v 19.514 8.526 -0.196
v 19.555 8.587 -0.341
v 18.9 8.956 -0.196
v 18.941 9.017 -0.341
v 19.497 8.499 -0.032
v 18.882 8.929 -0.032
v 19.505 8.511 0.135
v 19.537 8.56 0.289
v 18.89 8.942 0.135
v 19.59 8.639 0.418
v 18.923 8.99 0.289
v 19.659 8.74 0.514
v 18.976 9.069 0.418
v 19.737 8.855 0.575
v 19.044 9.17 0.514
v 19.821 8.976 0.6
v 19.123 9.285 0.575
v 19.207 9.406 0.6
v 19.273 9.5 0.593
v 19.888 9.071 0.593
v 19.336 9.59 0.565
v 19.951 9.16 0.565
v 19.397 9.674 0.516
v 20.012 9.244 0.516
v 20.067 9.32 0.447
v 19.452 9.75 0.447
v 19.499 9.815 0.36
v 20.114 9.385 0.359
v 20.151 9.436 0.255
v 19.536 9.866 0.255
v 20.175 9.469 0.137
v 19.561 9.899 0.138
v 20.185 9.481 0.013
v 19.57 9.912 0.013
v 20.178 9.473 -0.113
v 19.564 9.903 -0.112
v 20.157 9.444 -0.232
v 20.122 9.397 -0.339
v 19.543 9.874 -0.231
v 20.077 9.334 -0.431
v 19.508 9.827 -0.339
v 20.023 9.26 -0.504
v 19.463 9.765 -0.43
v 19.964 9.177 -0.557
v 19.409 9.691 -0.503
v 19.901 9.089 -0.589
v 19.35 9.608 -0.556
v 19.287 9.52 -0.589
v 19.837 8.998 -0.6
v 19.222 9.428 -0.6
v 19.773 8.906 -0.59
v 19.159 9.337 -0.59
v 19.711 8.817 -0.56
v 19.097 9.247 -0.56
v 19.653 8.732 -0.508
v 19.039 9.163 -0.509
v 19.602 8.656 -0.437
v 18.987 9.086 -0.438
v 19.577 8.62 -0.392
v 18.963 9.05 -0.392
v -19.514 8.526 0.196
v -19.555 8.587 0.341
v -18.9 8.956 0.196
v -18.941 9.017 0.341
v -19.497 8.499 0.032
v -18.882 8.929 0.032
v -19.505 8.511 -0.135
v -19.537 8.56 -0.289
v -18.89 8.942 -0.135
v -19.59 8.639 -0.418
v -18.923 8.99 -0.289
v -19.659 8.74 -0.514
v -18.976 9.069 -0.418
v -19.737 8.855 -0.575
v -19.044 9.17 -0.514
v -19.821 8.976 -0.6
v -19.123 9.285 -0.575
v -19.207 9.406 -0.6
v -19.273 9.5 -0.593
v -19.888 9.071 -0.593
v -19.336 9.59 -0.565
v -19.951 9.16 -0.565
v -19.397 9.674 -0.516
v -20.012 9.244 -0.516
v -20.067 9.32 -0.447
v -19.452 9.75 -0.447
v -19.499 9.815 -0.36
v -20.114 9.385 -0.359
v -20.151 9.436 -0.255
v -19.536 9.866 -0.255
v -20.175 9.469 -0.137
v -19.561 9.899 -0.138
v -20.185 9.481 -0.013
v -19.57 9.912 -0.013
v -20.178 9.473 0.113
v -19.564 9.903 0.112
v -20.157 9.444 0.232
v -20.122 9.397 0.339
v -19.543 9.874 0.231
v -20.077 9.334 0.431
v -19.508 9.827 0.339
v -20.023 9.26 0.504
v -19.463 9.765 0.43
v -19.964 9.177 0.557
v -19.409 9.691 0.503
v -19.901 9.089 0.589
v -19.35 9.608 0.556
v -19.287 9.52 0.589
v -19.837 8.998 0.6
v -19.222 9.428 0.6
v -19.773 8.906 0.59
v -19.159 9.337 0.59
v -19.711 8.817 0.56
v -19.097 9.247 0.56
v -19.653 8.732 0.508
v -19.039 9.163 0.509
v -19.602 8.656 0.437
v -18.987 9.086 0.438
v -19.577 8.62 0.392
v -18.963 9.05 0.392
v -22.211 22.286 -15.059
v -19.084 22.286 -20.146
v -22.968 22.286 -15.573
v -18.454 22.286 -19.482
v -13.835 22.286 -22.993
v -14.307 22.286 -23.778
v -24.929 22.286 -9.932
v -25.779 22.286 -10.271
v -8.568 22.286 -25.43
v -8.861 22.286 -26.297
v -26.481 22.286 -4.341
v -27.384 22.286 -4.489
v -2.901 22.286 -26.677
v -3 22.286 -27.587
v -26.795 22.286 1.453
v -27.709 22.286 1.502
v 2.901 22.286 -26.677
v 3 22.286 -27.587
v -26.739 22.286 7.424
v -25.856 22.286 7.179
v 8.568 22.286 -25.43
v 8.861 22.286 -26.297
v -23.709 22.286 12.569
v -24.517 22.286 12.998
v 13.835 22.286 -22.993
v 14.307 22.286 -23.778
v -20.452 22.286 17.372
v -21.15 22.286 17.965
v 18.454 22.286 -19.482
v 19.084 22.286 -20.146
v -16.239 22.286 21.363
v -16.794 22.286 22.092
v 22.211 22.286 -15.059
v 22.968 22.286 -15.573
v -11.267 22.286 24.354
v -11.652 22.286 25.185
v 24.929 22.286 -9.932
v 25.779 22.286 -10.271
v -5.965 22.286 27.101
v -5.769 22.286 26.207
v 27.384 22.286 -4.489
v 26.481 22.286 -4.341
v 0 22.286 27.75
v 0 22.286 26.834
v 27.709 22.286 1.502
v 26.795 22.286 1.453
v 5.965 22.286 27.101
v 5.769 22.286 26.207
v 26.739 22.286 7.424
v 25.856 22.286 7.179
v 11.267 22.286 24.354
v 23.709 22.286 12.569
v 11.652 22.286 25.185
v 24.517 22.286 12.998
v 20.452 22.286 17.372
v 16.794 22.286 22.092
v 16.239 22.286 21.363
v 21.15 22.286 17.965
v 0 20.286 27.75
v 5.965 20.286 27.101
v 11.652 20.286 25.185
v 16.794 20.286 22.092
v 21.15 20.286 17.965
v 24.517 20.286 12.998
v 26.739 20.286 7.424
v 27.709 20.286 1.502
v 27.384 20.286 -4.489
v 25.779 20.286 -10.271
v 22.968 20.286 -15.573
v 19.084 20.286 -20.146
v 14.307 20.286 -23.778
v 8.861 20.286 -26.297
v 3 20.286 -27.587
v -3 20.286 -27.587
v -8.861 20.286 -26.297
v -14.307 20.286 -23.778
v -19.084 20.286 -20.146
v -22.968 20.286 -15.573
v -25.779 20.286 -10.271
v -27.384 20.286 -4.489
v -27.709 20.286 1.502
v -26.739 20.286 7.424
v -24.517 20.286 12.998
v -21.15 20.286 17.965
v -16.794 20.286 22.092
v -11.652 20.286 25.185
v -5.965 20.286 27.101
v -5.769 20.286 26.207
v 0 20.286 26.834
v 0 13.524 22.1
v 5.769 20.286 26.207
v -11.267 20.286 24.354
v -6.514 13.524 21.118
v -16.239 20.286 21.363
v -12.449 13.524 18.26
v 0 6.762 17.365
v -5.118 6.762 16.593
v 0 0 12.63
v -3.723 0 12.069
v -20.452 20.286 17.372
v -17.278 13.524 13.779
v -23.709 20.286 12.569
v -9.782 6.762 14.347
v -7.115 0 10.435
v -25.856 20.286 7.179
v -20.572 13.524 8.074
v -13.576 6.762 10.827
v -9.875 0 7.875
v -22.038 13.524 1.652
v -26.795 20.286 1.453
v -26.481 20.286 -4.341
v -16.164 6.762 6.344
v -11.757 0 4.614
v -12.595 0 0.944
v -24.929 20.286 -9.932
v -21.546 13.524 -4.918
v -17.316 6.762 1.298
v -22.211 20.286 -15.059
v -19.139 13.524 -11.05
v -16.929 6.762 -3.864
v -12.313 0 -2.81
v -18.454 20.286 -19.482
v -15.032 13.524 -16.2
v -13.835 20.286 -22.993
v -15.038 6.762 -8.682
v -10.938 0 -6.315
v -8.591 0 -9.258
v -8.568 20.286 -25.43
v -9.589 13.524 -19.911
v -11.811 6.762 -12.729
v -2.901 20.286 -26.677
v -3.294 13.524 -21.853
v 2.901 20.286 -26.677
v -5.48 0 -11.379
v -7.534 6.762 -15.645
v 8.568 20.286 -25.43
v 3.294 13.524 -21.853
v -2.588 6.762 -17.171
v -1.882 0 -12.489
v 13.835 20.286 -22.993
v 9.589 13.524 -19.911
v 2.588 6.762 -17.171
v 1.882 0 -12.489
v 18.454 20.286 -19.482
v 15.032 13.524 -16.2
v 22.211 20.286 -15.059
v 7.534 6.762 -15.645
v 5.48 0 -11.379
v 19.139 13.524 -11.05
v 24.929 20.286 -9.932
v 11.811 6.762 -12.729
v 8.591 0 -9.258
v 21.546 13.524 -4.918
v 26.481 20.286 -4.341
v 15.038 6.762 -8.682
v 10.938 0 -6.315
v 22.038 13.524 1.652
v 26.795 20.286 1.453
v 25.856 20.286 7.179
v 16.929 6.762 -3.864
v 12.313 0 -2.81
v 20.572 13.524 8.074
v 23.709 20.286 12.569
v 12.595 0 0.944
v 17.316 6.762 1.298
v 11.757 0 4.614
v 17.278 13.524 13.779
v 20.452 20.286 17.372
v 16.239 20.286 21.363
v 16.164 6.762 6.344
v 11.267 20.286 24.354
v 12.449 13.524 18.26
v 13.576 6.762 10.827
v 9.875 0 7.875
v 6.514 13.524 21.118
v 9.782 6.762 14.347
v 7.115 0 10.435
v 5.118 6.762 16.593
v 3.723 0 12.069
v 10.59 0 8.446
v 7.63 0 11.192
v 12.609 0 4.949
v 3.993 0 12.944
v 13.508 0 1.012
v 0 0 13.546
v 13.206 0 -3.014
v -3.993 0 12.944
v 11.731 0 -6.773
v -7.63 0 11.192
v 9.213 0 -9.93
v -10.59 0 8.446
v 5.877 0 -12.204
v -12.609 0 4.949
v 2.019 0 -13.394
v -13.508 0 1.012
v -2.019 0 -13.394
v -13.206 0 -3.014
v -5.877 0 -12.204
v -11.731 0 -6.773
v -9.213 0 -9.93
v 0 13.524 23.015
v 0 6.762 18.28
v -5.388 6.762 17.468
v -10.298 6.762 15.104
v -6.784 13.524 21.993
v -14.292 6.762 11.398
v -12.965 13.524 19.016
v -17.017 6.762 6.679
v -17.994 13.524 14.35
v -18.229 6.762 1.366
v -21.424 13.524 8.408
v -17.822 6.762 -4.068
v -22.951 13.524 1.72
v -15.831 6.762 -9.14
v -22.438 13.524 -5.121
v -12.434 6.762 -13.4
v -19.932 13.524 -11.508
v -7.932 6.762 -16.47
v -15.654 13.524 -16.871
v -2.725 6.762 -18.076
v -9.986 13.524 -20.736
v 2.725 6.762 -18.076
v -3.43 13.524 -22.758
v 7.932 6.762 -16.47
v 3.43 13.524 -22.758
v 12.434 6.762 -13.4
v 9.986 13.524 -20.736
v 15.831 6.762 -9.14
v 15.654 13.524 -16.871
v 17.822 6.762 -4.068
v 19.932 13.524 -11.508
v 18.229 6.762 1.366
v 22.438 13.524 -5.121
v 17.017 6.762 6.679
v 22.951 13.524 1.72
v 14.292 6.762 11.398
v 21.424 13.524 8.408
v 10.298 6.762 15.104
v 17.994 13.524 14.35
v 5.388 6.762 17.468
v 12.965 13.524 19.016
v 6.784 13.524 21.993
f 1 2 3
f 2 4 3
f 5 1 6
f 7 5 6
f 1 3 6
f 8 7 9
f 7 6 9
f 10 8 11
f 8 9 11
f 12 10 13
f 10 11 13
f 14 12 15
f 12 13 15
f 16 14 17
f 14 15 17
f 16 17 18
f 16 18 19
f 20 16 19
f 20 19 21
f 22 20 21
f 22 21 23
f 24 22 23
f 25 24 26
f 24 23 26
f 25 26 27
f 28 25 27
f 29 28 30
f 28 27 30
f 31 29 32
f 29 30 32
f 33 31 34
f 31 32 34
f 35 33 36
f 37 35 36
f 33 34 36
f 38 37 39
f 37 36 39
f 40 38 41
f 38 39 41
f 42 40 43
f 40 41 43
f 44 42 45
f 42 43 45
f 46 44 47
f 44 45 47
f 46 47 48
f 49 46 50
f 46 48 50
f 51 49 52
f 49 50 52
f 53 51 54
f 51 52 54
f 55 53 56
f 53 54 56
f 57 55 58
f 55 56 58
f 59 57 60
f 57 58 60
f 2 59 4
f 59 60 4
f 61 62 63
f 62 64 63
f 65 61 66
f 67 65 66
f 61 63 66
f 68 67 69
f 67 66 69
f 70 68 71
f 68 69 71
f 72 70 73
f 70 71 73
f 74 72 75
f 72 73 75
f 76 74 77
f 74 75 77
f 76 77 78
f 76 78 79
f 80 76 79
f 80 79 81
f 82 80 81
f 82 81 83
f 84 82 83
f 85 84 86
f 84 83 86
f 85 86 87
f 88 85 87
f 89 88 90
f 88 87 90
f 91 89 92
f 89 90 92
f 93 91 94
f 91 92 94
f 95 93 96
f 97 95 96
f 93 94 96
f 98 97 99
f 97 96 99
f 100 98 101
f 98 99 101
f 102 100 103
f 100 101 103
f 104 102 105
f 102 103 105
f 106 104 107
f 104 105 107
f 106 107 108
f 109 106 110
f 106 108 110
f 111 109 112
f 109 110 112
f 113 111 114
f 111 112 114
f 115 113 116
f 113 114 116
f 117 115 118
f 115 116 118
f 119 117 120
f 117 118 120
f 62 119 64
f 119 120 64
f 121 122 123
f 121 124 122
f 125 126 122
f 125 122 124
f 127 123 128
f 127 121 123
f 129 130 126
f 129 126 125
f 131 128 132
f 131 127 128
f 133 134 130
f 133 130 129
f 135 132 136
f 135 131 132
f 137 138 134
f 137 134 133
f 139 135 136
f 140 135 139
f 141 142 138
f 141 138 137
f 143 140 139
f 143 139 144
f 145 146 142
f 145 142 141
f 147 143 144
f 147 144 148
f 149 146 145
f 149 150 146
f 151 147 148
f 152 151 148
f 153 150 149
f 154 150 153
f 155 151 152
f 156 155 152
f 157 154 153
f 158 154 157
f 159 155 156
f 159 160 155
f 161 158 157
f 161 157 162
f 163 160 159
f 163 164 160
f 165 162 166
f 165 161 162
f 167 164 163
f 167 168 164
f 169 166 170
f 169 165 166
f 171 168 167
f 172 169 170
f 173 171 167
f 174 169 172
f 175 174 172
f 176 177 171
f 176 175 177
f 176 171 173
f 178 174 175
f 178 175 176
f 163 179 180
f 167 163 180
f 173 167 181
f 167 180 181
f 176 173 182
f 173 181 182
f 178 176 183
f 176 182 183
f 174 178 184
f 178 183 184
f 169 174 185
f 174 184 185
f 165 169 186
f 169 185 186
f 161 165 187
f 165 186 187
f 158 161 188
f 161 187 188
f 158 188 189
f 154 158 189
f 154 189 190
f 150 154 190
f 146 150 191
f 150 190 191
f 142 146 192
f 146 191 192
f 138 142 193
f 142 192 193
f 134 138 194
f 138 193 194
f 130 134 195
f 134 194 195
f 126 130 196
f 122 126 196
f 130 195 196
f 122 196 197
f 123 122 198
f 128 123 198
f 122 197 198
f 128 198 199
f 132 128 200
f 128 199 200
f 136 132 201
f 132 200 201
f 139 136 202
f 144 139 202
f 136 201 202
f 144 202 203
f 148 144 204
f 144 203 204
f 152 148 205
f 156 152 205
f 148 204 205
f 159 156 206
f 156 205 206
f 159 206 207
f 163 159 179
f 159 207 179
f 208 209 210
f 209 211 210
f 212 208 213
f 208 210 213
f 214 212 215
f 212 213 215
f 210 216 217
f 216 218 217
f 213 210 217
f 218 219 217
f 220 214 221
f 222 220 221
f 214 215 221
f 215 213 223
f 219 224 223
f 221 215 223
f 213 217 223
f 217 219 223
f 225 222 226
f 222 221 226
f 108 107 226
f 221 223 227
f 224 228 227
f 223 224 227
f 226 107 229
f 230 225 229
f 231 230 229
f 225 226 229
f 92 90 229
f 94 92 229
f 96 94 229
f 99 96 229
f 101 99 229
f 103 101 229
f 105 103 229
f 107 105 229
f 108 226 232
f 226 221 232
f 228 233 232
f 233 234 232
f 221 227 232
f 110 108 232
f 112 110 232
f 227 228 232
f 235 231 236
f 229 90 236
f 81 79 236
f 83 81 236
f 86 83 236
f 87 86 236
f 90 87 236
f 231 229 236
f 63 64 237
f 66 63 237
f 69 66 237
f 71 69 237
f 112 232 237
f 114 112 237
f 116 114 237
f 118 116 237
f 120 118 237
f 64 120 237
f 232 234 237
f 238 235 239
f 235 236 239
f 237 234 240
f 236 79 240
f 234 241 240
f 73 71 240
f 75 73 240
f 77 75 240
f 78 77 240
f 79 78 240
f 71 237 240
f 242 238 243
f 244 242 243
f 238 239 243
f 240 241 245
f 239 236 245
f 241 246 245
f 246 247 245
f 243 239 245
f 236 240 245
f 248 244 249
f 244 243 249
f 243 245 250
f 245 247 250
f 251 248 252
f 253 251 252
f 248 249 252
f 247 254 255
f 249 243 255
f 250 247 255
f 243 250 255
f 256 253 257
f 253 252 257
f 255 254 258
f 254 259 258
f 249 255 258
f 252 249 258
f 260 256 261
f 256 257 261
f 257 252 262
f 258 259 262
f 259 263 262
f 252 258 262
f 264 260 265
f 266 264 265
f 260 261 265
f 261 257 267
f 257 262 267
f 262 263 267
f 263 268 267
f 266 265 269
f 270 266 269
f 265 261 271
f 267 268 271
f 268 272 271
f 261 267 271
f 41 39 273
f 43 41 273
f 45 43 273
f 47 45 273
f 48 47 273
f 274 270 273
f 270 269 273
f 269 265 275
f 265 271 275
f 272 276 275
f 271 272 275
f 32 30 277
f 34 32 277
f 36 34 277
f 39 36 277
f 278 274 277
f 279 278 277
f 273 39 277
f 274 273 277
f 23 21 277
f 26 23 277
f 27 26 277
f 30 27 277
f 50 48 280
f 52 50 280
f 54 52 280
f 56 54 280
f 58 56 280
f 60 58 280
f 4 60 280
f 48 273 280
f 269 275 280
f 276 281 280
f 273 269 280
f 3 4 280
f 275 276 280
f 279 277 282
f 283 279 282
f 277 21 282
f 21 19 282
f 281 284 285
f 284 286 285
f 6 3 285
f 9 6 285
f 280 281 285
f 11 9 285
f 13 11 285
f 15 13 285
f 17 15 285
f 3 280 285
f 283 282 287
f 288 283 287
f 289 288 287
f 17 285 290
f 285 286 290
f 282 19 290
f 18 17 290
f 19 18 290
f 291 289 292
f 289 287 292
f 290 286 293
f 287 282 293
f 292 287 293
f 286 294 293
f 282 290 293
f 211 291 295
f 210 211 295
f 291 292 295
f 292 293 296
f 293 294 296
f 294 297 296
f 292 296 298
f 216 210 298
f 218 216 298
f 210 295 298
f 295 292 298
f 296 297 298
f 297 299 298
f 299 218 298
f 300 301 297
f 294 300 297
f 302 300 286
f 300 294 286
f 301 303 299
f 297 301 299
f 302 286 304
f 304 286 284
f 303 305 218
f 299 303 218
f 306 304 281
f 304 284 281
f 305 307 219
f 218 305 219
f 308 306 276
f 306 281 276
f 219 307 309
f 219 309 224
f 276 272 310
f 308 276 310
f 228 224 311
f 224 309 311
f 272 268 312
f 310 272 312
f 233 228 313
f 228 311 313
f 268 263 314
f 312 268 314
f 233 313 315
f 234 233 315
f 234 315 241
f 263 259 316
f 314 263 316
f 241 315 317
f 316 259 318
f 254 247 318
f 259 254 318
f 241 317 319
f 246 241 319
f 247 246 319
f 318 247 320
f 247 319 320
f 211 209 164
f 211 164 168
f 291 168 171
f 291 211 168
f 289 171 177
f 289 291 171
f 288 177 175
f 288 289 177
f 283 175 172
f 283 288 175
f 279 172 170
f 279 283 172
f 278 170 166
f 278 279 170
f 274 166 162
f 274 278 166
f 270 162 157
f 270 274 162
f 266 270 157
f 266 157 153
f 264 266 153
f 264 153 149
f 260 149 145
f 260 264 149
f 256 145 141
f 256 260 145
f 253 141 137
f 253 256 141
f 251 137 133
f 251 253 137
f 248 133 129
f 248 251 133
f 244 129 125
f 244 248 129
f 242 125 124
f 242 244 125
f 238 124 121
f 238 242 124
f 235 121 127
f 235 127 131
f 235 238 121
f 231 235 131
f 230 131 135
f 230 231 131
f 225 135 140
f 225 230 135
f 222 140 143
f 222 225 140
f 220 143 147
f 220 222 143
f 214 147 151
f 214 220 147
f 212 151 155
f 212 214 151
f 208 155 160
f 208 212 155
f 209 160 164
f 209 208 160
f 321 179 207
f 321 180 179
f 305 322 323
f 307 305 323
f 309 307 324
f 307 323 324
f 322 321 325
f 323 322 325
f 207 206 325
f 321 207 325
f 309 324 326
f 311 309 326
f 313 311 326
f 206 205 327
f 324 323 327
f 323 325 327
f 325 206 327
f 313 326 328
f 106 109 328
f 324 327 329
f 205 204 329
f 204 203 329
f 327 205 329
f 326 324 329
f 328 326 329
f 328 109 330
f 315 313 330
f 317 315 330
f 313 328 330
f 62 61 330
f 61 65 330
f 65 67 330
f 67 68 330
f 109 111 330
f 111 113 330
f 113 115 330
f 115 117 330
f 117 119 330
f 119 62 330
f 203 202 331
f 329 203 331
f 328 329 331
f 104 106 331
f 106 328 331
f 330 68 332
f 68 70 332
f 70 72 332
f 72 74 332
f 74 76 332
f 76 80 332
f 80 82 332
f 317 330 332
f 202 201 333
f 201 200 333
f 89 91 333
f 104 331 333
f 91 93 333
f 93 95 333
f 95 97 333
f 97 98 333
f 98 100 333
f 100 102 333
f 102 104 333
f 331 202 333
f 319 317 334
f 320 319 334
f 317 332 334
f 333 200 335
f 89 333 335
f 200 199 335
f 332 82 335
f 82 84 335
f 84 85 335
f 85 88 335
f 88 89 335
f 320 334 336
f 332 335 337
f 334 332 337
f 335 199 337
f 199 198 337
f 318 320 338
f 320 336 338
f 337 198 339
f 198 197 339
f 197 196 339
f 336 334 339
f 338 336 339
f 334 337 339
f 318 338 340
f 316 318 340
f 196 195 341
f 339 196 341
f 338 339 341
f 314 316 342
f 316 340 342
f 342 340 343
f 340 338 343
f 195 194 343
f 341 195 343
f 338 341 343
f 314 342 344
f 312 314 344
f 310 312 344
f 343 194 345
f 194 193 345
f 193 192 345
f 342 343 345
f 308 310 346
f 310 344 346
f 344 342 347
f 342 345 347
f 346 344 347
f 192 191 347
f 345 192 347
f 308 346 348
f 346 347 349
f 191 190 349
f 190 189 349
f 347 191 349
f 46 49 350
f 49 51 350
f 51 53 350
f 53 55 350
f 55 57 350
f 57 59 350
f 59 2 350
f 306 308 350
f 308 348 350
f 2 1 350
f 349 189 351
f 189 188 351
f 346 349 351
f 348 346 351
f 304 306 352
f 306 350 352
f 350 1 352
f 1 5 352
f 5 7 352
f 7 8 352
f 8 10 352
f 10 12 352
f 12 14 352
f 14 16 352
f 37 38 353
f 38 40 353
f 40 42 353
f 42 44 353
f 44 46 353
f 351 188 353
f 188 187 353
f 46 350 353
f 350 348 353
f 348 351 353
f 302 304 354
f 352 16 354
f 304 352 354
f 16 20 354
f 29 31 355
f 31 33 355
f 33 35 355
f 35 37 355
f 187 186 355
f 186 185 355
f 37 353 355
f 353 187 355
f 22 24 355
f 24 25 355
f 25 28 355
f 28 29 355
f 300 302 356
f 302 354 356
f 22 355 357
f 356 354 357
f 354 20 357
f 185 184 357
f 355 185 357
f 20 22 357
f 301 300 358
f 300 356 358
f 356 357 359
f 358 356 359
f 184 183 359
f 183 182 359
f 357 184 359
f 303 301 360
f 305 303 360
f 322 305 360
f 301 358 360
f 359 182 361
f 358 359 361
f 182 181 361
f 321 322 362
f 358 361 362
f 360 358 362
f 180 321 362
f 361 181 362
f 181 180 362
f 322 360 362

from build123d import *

# Parameters (mm, degrees)
SKETCH36_R          = 0.6
SIDE_HOLES_DEPTH    = 2
CIRPATTERN2_COUNT   = 2
SKETCH37_R          = 27.75
SKETCH37_R_2        = 26.834419058
BOSS_EXTRUDE1_DEPTH = 2


with BuildPart() as part:
    # Sketch35 → Revolve1 (revolve)
    with BuildSketch(Plane.XY):
        Polygon((12.63, 0), (13.545580942, 0), (27.75, 20.286012765), (26.834419058, 20.286012765), align=None)
    revolve(axis=Axis((0, 20.286012765, 0), (0, -1, 0)))

    # Sketch36 → side-holes (cut, symmetric)
    with BuildSketch(Plane(origin=(8.474857205, -5.9341589, 0), x_dir=(0, 0, 1), z_dir=(-0.8191520442889934, 0.5735764363510439, 0))):
        with Locations((0, 18.744270391)):
            Circle(SKETCH36_R)
    side_holes = extrude(amount=SIDE_HOLES_DEPTH, both=True, mode=Mode.SUBTRACT)

    # CirPattern2: side-holes ×2 about axis
    cirpattern2_axis = Axis((0, 0, 0), (0, 1, 0))
    for i in range(1, CIRPATTERN2_COUNT):
        add(side_holes.rotate(cirpattern2_axis, i * 360 / CIRPATTERN2_COUNT), mode=Mode.SUBTRACT)

    # Sketch37 → Boss-Extrude1 (add)
    with BuildSketch(Plane(origin=(0, 20.286012765, 0), x_dir=(1, 0, 0), z_dir=(0, 1, 0))):
        Circle(SKETCH37_R)
        Circle(SKETCH37_R_2, mode=Mode.SUBTRACT)
    extrude(amount=BOSS_EXTRUDE1_DEPTH)


solid = part.part
